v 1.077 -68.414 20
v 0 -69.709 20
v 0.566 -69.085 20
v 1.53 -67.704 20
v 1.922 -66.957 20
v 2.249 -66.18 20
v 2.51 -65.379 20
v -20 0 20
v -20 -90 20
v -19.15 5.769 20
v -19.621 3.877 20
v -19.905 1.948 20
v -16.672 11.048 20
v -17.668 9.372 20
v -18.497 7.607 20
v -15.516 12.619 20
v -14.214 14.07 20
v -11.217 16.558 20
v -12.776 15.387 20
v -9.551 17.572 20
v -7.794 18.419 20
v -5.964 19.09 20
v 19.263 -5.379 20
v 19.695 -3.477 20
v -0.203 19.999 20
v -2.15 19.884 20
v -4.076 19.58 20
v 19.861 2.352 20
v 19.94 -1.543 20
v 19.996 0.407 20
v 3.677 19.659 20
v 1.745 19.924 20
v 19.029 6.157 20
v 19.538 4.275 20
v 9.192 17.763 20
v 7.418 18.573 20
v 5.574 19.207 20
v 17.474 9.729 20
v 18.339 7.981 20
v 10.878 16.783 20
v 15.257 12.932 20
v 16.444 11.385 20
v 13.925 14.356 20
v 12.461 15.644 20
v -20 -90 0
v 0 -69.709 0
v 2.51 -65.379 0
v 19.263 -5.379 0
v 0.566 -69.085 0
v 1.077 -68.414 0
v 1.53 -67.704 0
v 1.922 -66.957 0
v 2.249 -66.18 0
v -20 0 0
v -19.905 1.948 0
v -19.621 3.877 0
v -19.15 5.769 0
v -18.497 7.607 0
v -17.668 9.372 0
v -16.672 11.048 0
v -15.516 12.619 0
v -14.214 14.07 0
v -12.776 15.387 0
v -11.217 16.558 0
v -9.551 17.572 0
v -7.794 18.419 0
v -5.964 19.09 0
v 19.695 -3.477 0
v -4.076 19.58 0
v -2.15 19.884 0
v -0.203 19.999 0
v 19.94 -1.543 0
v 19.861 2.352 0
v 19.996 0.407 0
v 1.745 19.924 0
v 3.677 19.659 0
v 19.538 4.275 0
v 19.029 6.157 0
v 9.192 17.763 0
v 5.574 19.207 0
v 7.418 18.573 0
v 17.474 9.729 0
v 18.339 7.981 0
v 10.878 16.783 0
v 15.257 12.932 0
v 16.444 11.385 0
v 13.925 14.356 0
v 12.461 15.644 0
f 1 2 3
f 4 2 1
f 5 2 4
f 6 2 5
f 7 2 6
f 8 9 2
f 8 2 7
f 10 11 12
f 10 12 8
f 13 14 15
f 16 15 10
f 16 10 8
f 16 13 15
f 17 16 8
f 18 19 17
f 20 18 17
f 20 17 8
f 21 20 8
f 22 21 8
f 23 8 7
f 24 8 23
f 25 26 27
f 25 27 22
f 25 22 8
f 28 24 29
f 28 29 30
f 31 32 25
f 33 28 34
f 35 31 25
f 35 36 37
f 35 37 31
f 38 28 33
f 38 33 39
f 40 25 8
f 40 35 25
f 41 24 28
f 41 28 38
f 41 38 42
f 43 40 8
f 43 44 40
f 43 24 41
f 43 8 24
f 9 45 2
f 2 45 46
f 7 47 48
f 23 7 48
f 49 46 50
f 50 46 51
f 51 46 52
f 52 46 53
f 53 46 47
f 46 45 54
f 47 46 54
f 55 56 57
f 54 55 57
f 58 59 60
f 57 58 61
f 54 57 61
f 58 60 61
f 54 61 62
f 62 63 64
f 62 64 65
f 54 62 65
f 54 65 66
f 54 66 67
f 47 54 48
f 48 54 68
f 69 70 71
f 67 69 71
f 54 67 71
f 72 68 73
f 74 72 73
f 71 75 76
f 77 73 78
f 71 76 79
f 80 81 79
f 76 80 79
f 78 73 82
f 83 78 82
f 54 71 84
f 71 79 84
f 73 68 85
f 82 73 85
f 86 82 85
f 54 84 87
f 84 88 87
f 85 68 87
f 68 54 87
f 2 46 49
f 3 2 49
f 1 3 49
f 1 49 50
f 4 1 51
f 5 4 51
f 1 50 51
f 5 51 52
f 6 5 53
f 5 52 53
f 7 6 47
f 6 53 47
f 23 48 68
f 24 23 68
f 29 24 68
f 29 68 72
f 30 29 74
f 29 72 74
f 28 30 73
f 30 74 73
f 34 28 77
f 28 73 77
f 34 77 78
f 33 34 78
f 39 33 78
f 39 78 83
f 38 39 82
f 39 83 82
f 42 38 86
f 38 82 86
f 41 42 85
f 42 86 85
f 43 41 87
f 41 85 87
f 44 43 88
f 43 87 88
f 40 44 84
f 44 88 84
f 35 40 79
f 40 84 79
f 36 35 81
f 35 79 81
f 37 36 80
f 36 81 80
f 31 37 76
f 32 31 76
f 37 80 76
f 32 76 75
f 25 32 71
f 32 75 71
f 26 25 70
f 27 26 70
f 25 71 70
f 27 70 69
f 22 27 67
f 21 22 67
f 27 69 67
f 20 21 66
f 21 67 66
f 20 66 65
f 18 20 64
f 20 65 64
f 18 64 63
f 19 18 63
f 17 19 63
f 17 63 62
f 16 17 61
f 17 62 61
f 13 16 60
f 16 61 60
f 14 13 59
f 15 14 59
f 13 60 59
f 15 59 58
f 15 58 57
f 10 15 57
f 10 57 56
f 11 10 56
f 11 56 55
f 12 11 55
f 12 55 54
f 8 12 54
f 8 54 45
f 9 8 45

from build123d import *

# Parameters (mm, degrees)
BOSS_EXTRUDE1_DEPTH = 20


with BuildPart() as part:
    # Sketch1 → Boss-Extrude1 (new body)
    with BuildSketch(Plane.XY):
        with BuildLine():
            Line((-20, 0), (-20, -90))
            Line((-20, -90), (0, -69.709229677))
            ThreePointArc((0, -69.709229677), (1.530145443, -67.703543845), (2.509663453, -65.378750262))
            Line((2.509663453, -65.378750262), (19.263152536, -5.378750262))
            ThreePointArc((19.263152536, -5.378750262), (2.714493441, 19.814931879), (-20, 0))
        make_face()
    extrude(amount=BOSS_EXTRUDE1_DEPTH)


solid = part.part
